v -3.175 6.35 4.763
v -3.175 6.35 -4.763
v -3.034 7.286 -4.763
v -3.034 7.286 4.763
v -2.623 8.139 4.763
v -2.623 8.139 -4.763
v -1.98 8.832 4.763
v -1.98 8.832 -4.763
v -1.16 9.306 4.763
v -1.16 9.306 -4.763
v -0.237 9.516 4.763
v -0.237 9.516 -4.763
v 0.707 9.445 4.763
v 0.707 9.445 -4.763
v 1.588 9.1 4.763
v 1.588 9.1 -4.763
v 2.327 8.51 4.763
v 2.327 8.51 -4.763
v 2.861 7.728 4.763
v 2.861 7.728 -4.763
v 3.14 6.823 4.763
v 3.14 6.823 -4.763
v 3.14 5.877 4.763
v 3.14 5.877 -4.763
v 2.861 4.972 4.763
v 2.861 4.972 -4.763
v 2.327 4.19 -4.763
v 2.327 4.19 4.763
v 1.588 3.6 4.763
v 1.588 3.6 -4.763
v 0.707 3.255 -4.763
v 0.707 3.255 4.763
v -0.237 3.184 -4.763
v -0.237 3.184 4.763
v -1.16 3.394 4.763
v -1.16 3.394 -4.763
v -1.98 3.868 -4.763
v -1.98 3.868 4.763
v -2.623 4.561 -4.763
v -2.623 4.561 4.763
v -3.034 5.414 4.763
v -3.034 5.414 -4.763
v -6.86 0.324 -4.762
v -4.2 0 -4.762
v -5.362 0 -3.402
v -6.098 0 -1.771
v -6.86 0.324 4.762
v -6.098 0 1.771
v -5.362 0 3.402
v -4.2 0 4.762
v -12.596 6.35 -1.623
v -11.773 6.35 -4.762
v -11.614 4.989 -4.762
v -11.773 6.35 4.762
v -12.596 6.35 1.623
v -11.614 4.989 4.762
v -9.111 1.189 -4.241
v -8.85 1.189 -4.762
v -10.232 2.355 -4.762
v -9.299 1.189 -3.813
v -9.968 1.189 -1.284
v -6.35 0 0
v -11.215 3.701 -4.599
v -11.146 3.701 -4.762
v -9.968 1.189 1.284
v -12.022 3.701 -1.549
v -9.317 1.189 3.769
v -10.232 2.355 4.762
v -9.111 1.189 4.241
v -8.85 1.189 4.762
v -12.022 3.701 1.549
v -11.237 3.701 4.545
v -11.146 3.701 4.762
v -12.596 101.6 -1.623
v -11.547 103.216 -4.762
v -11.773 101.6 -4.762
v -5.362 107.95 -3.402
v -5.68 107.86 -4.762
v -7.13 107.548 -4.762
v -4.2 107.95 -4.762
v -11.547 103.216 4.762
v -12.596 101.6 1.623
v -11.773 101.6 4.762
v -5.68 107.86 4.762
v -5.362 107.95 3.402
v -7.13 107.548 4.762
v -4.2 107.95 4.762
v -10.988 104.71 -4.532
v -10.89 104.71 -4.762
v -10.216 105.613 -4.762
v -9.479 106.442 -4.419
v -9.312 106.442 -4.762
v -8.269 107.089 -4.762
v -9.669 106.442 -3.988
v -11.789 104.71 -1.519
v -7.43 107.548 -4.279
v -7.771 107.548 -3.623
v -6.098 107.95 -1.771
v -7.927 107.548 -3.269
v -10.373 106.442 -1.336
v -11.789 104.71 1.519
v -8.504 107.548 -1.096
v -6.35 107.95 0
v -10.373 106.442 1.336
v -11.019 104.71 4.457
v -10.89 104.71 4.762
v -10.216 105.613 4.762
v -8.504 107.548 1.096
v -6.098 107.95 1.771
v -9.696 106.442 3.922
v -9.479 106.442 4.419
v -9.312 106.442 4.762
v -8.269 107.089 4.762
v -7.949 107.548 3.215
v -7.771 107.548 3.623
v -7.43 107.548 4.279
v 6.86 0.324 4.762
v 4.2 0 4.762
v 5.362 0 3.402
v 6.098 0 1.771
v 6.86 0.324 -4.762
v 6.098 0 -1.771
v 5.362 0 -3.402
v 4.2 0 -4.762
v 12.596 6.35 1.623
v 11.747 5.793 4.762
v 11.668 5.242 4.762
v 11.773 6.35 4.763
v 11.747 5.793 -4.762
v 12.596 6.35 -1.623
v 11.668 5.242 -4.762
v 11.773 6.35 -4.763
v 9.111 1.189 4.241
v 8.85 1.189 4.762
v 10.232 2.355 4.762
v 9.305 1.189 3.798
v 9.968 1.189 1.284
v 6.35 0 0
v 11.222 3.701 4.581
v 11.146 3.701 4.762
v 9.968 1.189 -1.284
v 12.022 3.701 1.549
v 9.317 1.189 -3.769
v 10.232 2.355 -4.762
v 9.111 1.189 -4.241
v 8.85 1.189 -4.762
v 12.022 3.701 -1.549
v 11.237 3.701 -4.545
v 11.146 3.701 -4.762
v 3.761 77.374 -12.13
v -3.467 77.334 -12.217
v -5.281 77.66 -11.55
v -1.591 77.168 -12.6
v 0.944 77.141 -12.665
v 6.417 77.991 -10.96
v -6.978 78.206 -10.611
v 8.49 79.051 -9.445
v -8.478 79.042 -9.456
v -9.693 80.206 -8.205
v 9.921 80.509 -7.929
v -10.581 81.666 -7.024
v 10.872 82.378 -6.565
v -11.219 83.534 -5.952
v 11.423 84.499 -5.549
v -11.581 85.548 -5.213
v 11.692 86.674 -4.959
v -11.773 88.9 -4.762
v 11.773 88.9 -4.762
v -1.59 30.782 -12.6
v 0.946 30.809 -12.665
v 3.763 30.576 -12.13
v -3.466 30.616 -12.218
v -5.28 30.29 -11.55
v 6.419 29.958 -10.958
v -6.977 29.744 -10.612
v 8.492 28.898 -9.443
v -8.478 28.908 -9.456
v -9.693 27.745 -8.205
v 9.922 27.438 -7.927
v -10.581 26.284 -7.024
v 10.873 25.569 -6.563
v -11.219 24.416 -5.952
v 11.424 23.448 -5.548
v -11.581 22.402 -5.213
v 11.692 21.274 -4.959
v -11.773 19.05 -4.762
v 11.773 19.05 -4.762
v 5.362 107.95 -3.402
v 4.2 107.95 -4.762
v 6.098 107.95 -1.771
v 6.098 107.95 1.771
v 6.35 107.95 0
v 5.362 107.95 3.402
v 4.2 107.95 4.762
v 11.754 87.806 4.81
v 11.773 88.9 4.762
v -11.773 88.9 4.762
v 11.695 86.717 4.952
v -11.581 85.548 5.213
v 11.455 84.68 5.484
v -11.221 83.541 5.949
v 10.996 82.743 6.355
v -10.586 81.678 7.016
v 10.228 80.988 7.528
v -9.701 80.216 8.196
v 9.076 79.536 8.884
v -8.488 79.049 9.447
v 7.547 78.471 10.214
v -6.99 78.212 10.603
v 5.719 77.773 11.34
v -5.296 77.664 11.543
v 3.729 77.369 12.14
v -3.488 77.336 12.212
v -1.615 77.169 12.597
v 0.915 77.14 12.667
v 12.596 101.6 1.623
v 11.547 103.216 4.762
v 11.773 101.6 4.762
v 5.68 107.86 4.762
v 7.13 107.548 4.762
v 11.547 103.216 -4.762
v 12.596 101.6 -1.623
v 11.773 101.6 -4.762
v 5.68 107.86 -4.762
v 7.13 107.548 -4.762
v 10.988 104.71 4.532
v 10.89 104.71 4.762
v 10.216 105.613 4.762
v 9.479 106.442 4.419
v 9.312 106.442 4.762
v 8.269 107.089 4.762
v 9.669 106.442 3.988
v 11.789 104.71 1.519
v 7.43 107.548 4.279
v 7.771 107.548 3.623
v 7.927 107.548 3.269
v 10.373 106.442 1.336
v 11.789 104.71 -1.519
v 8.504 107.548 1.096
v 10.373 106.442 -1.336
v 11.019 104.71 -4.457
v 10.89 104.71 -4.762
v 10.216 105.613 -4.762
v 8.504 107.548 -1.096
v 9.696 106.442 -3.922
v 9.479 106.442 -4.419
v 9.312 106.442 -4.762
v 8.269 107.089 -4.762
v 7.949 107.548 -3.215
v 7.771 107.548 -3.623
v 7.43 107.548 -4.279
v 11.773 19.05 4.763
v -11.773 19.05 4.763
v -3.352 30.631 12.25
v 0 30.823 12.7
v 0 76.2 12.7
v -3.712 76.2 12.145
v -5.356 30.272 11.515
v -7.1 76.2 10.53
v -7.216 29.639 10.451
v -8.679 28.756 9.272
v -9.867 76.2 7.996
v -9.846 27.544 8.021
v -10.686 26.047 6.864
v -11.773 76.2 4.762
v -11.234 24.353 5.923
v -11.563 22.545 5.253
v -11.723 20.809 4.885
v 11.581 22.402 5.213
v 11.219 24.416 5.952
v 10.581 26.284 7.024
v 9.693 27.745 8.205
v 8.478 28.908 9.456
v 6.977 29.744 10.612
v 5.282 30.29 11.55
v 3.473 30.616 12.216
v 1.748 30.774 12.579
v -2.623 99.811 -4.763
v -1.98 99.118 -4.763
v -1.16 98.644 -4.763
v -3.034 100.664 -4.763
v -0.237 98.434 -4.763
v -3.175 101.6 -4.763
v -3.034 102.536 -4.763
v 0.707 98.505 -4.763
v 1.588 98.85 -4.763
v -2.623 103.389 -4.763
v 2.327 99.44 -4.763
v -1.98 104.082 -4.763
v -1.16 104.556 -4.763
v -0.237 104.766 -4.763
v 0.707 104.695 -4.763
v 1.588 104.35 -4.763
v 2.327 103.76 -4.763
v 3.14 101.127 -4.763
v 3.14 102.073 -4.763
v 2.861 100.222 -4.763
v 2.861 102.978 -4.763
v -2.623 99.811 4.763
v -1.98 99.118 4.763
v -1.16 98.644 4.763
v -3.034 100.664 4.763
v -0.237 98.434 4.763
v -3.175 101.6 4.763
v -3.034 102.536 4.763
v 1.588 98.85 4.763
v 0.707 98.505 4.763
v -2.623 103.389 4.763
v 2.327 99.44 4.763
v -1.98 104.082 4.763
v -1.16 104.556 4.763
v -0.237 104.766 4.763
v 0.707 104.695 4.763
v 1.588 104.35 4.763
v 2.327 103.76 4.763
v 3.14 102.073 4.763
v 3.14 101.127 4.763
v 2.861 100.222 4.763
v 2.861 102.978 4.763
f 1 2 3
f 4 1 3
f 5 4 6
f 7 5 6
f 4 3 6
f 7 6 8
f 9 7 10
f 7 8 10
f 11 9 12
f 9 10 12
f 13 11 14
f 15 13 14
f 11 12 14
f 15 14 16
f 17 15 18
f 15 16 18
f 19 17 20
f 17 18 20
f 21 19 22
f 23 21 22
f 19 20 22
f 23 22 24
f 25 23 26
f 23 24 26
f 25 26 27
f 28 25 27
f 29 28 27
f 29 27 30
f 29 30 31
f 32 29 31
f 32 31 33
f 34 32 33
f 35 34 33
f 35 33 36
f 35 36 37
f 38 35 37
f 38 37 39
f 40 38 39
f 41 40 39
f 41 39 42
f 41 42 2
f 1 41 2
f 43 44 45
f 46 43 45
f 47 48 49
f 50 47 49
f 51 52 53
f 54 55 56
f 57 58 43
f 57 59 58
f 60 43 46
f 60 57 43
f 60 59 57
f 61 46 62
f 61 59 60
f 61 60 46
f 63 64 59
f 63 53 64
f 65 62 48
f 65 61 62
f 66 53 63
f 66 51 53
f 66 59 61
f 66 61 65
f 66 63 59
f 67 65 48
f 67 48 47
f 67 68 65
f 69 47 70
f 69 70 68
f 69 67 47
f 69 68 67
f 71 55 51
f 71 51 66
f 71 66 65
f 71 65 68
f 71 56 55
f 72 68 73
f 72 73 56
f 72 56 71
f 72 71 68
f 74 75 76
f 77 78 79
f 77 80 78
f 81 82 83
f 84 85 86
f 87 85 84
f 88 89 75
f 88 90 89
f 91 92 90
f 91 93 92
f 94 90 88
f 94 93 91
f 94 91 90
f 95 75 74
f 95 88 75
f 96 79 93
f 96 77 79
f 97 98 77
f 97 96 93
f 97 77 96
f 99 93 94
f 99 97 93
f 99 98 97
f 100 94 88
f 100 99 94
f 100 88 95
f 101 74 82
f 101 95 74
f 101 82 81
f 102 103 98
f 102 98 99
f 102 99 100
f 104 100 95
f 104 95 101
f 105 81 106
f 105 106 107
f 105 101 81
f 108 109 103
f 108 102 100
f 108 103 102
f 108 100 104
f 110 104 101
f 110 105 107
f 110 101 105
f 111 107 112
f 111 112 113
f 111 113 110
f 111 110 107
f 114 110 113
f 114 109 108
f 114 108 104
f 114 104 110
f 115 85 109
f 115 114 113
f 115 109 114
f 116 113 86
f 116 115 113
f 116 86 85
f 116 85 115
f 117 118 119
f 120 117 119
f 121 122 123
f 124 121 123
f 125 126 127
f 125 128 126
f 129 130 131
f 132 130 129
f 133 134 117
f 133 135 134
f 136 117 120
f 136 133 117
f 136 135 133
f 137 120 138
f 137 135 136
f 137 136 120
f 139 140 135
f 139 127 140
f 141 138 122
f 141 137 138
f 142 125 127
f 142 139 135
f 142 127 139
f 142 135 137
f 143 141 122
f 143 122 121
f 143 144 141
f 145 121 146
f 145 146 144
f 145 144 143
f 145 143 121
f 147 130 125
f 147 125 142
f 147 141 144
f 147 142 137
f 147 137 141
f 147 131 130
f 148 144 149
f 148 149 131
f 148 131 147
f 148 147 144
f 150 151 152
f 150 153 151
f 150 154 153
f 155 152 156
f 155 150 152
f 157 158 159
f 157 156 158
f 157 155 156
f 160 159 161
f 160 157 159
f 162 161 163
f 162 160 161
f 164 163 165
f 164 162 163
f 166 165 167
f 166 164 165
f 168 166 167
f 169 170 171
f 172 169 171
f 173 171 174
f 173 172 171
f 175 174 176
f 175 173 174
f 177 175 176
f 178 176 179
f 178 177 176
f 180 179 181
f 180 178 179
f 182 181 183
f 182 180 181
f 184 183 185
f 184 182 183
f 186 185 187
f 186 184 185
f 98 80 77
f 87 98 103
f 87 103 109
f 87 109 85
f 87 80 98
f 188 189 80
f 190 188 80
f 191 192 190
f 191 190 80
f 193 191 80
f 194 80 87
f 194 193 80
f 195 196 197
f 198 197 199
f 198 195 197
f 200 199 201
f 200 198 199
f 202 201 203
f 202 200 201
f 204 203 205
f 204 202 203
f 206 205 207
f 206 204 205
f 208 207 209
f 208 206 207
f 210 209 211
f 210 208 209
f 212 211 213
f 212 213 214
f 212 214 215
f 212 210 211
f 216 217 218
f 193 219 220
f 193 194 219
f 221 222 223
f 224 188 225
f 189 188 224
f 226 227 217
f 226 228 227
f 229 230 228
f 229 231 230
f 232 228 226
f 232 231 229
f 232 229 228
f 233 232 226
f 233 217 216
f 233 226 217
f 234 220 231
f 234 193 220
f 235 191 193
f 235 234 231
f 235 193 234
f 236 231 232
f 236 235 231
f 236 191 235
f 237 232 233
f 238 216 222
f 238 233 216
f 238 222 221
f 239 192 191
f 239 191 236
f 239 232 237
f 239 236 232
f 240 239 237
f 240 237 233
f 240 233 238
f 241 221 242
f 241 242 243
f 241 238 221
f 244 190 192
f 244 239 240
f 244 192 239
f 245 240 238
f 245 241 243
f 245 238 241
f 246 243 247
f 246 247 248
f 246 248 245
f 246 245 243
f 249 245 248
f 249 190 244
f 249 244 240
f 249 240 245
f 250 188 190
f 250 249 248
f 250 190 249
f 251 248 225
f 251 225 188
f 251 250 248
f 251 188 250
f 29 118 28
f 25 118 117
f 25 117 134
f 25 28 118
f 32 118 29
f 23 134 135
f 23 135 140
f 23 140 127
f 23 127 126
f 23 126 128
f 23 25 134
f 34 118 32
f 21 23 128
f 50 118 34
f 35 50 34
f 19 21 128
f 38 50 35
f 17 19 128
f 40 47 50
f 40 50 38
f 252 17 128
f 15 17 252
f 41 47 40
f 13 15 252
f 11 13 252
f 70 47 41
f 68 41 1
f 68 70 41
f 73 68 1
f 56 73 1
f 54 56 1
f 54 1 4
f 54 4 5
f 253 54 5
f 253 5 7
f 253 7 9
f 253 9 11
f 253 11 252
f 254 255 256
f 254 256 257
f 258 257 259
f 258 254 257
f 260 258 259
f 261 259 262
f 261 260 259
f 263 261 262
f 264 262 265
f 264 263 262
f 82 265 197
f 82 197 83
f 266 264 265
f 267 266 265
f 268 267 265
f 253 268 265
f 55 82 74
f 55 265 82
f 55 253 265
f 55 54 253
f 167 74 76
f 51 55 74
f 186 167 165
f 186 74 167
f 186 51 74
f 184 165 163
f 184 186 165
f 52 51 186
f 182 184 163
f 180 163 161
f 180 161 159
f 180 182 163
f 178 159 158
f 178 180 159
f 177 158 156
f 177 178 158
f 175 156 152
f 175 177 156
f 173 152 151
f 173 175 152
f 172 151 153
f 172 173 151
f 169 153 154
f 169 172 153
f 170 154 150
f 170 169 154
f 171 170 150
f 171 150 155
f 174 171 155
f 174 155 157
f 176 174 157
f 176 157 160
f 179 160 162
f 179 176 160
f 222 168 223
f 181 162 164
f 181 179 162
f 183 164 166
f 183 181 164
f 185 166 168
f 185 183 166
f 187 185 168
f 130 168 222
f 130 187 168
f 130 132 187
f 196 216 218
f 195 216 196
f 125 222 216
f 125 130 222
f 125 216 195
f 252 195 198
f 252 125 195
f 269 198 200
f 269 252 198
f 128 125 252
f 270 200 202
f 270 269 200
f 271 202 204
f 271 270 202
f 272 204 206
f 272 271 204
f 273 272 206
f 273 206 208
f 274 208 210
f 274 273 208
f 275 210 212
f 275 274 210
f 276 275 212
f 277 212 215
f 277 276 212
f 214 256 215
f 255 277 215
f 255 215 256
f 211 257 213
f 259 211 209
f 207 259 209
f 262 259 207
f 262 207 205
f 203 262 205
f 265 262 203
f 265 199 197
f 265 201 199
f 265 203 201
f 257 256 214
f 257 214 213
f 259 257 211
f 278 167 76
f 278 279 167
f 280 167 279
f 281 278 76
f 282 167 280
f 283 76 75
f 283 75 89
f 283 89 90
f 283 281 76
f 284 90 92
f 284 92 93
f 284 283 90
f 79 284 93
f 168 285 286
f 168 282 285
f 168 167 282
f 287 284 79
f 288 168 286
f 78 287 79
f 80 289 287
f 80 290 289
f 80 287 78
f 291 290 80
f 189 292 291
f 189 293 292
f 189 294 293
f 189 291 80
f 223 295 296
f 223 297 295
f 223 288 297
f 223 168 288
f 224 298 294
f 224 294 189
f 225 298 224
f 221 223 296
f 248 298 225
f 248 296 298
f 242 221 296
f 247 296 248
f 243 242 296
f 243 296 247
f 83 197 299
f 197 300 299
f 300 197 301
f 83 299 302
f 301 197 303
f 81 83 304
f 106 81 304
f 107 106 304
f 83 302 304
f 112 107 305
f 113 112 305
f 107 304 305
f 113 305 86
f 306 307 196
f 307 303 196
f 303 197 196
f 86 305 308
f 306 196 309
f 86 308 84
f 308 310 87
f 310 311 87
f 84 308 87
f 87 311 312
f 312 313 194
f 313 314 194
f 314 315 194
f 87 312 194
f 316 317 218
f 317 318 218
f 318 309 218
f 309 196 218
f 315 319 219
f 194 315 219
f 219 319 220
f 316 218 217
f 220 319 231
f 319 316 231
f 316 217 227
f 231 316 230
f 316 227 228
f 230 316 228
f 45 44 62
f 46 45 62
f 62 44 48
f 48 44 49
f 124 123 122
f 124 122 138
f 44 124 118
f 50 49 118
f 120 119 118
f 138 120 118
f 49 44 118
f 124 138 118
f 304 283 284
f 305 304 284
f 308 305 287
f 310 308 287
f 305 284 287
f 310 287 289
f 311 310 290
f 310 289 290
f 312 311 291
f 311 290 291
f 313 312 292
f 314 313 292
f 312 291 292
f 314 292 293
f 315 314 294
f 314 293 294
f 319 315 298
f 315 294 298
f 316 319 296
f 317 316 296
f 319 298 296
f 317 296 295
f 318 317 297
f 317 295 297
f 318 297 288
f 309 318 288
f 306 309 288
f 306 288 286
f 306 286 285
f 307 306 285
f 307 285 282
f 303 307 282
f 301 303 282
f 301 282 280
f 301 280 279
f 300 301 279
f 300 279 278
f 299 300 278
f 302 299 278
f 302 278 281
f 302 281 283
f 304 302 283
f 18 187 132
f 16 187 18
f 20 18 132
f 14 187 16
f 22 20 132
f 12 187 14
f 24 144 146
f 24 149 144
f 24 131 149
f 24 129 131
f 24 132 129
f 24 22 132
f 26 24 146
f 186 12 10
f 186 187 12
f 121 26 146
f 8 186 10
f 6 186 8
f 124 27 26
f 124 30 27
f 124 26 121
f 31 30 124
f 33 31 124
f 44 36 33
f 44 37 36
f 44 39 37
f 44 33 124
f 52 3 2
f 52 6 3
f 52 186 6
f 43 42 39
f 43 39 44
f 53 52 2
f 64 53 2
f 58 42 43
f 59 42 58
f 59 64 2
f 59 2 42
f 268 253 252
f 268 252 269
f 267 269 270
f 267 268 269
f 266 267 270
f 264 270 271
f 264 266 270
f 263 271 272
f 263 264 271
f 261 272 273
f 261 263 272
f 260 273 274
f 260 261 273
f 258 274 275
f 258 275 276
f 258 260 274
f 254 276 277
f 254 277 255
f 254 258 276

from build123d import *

# Parameters (mm, degrees)
SKETCH1_R           = 12.7
BOSS_EXTRUDE1_DEPTH = 107.95
SKETCH2_W           = 7.9375
SKETCH2_H           = 31.75
CUT_EXTRUDE1_DEPTH  = 112.622813528
FILLET1_R           = 12.7
MIRROR1_START       = -11.773215198
MIRROR1_DEPTH       = 23.546430296
HOLE1_D             = 6.35
FILLET6_R           = 6.35


# Read off the part's stored shape, not the designer's step: Mirror1
with BuildPart() as part:
    # Sketch1 → Boss-Extrude1 (new body)
    with BuildSketch(Plane(origin=(0, 0, 0), x_dir=(1, 0, 0), z_dir=(0, 1, 0))):
        with Locations(Location((0, 0, 0), (0, 0, 270))):
            Circle(SKETCH1_R)
    extrude(amount=BOSS_EXTRUDE1_DEPTH)

    # Sketch2 → Cut-Extrude1 (cut, through all)
    with BuildSketch(Plane(origin=(12.7, 0, 0), x_dir=(0, 0, -1), z_dir=(1, 0, 0))):
        with Locations((8.73125, 92.075)):
            Rectangle(SKETCH2_W, SKETCH2_H)
        with Locations((-8.73125, 92.075)):
            Rectangle(SKETCH2_W, SKETCH2_H)
    extrude(amount=-CUT_EXTRUDE1_DEPTH, mode=Mode.SUBTRACT)

    # Fillet1
    # the kernel refuses this fillet: 12.7 mm, written as the material it adds along each edge
    with BuildSketch(Plane(origin=(43.523215098, 76.2, 4.7625), x_dir=(0, 1, 0), z_dir=(-1, 0, 0))) as fillet1_piece_1_section:
        with BuildLine():
            CenterArc((FILLET1_R, -FILLET1_R), FILLET1_R, 90, 90)
            Line((0, -FILLET1_R), (0, 0))
            Line((0, 0), (FILLET1_R, 0))
        make_face()
    fillet1_piece_1 = extrude(amount=87.046430197, mode=Mode.PRIVATE)
    fillet1_piece_1 = fillet1_piece_1 & Plane(origin=(0, 79.544884305, 0), x_dir=(0, 0, 1), z_dir=(0, -1, 0)) * Cylinder(12.7, 225, mode=Mode.PRIVATE)
    add(fillet1_piece_1)
    with BuildSketch(Plane(origin=(43.523215098, 76.2, -4.7625), x_dir=(0, 0, -1), z_dir=(-1, 0, 0))) as fillet1_piece_2_section:
        with BuildLine():
            CenterArc((FILLET1_R, -FILLET1_R), FILLET1_R, 90, 90)
            Line((0, -FILLET1_R), (0, 0))
            Line((0, 0), (FILLET1_R, 0))
        make_face()
    fillet1_piece_2 = extrude(amount=87.046430197, mode=Mode.PRIVATE)
    fillet1_piece_2 = fillet1_piece_2 & Plane(origin=(0, 79.544821944, 0), x_dir=(0, 0, 1), z_dir=(0, -1, 0)) * Cylinder(12.7, 225, mode=Mode.PRIVATE)
    add(fillet1_piece_2)

    # Mirror1 outline → Mirror1 (cut)
    with BuildSketch(Plane.YZ.offset(MIRROR1_START)):
        with BuildLine():
            Line((19.05, -4.7625), (0, -4.7625))
            Line((0, -4.7625), (0, -14))
            Line((0, -14), (31.349026101, -14))
            Line((31.349026101, -14), (30.823419426, -12.700505142))
            ThreePointArc((30.823419426, -12.700505142), (26.149741731, -6.932368598), (19.05, -4.7625))
        make_face()
        with BuildLine():
            Line((0, 14), (0, 4.7625))
            Line((0, 4.7625), (19.05, 4.7625))
            ThreePointArc((19.05, 4.7625), (26.149741731, 6.932368598), (30.823419426, 12.700505142))
            Line((30.823419426, 12.700505142), (31.349026101, 14))
            Line((31.349026101, 14), (0, 14))
        make_face()
    extrude(amount=MIRROR1_DEPTH, mode=Mode.SUBTRACT)

    # Hole1 (through all)
    with Locations(Plane.XY.offset(4.7625)):
        with Locations((0, 101.6), (0, 6.35)):
            Hole(HOLE1_D / 2)

    # Fillet6
    # the kernel refuses this fillet: 6.35 mm, written as the material it takes off along each edge
    with BuildSketch(Plane(origin=(0, 107.95, 0), x_dir=(-0.06367759150342109, 0, 0.9979705227812711), z_dir=(-0.9979705227812711, 0, -0.06367759150342109))) as fillet6_piece_1:
        with BuildLine():
            CenterArc((12.7 - FILLET6_R, -FILLET6_R), FILLET6_R, 0, 90)
            Line((12.7 - FILLET6_R, 0), (12.7, 0))
            Line((12.7, 0), (12.7, -FILLET6_R))
        make_face()
    revolve(axis=Axis((0, 107.95, 0), (0, 1, 0)), revolution_arc=187.301854803, mode=Mode.SUBTRACT)
    with BuildSketch(Plane(origin=(0, 0, 0), x_dir=(0.06367758856259068, 0, -0.9979705229689169), z_dir=(0.9979705229689169, 0, 0.06367758856259068))) as fillet6_piece_2:
        with BuildLine():
            CenterArc((12.7 - FILLET6_R, FILLET6_R), FILLET6_R, 270, 90)
            Line((12.7 - FILLET6_R, 0), (12.7, 0))
            Line((12.7, 0), (12.7, FILLET6_R))
        make_face()
    revolve(axis=Axis((0, 0, 0), (0, 1, 0)), revolution_arc=187.301854466, mode=Mode.SUBTRACT)
    with BuildSketch(Plane(origin=(0, 107.95, 0), x_dir=(0.06367759150341921, 0, -0.9979705227812712), z_dir=(0.9979705227812712, 0, 0.06367759150341921))) as fillet6_piece_3:
        with BuildLine():
            CenterArc((12.7 - FILLET6_R, -FILLET6_R), FILLET6_R, 0, 90)
            Line((12.7 - FILLET6_R, 0), (12.7, 0))
            Line((12.7, 0), (12.7, -FILLET6_R))
        make_face()
    revolve(axis=Axis((0, 107.95, 0), (0, 1, 0)), revolution_arc=187.301854803, mode=Mode.SUBTRACT)
    with BuildSketch(Plane(origin=(0, 0, 0), x_dir=(-0.06367759151119771, 0, 0.9979705227807748), z_dir=(-0.9979705227807748, 0, -0.06367759151119771))) as fillet6_piece_4:
        with BuildLine():
            CenterArc((12.7 - FILLET6_R, FILLET6_R), FILLET6_R, 270, 90)
            Line((12.7 - FILLET6_R, 0), (12.7, 0))
            Line((12.7, 0), (12.7, FILLET6_R))
        make_face()
    revolve(axis=Axis((0, 0, 0), (0, 1, 0)), revolution_arc=187.301854804, mode=Mode.SUBTRACT)


solid = part.part
